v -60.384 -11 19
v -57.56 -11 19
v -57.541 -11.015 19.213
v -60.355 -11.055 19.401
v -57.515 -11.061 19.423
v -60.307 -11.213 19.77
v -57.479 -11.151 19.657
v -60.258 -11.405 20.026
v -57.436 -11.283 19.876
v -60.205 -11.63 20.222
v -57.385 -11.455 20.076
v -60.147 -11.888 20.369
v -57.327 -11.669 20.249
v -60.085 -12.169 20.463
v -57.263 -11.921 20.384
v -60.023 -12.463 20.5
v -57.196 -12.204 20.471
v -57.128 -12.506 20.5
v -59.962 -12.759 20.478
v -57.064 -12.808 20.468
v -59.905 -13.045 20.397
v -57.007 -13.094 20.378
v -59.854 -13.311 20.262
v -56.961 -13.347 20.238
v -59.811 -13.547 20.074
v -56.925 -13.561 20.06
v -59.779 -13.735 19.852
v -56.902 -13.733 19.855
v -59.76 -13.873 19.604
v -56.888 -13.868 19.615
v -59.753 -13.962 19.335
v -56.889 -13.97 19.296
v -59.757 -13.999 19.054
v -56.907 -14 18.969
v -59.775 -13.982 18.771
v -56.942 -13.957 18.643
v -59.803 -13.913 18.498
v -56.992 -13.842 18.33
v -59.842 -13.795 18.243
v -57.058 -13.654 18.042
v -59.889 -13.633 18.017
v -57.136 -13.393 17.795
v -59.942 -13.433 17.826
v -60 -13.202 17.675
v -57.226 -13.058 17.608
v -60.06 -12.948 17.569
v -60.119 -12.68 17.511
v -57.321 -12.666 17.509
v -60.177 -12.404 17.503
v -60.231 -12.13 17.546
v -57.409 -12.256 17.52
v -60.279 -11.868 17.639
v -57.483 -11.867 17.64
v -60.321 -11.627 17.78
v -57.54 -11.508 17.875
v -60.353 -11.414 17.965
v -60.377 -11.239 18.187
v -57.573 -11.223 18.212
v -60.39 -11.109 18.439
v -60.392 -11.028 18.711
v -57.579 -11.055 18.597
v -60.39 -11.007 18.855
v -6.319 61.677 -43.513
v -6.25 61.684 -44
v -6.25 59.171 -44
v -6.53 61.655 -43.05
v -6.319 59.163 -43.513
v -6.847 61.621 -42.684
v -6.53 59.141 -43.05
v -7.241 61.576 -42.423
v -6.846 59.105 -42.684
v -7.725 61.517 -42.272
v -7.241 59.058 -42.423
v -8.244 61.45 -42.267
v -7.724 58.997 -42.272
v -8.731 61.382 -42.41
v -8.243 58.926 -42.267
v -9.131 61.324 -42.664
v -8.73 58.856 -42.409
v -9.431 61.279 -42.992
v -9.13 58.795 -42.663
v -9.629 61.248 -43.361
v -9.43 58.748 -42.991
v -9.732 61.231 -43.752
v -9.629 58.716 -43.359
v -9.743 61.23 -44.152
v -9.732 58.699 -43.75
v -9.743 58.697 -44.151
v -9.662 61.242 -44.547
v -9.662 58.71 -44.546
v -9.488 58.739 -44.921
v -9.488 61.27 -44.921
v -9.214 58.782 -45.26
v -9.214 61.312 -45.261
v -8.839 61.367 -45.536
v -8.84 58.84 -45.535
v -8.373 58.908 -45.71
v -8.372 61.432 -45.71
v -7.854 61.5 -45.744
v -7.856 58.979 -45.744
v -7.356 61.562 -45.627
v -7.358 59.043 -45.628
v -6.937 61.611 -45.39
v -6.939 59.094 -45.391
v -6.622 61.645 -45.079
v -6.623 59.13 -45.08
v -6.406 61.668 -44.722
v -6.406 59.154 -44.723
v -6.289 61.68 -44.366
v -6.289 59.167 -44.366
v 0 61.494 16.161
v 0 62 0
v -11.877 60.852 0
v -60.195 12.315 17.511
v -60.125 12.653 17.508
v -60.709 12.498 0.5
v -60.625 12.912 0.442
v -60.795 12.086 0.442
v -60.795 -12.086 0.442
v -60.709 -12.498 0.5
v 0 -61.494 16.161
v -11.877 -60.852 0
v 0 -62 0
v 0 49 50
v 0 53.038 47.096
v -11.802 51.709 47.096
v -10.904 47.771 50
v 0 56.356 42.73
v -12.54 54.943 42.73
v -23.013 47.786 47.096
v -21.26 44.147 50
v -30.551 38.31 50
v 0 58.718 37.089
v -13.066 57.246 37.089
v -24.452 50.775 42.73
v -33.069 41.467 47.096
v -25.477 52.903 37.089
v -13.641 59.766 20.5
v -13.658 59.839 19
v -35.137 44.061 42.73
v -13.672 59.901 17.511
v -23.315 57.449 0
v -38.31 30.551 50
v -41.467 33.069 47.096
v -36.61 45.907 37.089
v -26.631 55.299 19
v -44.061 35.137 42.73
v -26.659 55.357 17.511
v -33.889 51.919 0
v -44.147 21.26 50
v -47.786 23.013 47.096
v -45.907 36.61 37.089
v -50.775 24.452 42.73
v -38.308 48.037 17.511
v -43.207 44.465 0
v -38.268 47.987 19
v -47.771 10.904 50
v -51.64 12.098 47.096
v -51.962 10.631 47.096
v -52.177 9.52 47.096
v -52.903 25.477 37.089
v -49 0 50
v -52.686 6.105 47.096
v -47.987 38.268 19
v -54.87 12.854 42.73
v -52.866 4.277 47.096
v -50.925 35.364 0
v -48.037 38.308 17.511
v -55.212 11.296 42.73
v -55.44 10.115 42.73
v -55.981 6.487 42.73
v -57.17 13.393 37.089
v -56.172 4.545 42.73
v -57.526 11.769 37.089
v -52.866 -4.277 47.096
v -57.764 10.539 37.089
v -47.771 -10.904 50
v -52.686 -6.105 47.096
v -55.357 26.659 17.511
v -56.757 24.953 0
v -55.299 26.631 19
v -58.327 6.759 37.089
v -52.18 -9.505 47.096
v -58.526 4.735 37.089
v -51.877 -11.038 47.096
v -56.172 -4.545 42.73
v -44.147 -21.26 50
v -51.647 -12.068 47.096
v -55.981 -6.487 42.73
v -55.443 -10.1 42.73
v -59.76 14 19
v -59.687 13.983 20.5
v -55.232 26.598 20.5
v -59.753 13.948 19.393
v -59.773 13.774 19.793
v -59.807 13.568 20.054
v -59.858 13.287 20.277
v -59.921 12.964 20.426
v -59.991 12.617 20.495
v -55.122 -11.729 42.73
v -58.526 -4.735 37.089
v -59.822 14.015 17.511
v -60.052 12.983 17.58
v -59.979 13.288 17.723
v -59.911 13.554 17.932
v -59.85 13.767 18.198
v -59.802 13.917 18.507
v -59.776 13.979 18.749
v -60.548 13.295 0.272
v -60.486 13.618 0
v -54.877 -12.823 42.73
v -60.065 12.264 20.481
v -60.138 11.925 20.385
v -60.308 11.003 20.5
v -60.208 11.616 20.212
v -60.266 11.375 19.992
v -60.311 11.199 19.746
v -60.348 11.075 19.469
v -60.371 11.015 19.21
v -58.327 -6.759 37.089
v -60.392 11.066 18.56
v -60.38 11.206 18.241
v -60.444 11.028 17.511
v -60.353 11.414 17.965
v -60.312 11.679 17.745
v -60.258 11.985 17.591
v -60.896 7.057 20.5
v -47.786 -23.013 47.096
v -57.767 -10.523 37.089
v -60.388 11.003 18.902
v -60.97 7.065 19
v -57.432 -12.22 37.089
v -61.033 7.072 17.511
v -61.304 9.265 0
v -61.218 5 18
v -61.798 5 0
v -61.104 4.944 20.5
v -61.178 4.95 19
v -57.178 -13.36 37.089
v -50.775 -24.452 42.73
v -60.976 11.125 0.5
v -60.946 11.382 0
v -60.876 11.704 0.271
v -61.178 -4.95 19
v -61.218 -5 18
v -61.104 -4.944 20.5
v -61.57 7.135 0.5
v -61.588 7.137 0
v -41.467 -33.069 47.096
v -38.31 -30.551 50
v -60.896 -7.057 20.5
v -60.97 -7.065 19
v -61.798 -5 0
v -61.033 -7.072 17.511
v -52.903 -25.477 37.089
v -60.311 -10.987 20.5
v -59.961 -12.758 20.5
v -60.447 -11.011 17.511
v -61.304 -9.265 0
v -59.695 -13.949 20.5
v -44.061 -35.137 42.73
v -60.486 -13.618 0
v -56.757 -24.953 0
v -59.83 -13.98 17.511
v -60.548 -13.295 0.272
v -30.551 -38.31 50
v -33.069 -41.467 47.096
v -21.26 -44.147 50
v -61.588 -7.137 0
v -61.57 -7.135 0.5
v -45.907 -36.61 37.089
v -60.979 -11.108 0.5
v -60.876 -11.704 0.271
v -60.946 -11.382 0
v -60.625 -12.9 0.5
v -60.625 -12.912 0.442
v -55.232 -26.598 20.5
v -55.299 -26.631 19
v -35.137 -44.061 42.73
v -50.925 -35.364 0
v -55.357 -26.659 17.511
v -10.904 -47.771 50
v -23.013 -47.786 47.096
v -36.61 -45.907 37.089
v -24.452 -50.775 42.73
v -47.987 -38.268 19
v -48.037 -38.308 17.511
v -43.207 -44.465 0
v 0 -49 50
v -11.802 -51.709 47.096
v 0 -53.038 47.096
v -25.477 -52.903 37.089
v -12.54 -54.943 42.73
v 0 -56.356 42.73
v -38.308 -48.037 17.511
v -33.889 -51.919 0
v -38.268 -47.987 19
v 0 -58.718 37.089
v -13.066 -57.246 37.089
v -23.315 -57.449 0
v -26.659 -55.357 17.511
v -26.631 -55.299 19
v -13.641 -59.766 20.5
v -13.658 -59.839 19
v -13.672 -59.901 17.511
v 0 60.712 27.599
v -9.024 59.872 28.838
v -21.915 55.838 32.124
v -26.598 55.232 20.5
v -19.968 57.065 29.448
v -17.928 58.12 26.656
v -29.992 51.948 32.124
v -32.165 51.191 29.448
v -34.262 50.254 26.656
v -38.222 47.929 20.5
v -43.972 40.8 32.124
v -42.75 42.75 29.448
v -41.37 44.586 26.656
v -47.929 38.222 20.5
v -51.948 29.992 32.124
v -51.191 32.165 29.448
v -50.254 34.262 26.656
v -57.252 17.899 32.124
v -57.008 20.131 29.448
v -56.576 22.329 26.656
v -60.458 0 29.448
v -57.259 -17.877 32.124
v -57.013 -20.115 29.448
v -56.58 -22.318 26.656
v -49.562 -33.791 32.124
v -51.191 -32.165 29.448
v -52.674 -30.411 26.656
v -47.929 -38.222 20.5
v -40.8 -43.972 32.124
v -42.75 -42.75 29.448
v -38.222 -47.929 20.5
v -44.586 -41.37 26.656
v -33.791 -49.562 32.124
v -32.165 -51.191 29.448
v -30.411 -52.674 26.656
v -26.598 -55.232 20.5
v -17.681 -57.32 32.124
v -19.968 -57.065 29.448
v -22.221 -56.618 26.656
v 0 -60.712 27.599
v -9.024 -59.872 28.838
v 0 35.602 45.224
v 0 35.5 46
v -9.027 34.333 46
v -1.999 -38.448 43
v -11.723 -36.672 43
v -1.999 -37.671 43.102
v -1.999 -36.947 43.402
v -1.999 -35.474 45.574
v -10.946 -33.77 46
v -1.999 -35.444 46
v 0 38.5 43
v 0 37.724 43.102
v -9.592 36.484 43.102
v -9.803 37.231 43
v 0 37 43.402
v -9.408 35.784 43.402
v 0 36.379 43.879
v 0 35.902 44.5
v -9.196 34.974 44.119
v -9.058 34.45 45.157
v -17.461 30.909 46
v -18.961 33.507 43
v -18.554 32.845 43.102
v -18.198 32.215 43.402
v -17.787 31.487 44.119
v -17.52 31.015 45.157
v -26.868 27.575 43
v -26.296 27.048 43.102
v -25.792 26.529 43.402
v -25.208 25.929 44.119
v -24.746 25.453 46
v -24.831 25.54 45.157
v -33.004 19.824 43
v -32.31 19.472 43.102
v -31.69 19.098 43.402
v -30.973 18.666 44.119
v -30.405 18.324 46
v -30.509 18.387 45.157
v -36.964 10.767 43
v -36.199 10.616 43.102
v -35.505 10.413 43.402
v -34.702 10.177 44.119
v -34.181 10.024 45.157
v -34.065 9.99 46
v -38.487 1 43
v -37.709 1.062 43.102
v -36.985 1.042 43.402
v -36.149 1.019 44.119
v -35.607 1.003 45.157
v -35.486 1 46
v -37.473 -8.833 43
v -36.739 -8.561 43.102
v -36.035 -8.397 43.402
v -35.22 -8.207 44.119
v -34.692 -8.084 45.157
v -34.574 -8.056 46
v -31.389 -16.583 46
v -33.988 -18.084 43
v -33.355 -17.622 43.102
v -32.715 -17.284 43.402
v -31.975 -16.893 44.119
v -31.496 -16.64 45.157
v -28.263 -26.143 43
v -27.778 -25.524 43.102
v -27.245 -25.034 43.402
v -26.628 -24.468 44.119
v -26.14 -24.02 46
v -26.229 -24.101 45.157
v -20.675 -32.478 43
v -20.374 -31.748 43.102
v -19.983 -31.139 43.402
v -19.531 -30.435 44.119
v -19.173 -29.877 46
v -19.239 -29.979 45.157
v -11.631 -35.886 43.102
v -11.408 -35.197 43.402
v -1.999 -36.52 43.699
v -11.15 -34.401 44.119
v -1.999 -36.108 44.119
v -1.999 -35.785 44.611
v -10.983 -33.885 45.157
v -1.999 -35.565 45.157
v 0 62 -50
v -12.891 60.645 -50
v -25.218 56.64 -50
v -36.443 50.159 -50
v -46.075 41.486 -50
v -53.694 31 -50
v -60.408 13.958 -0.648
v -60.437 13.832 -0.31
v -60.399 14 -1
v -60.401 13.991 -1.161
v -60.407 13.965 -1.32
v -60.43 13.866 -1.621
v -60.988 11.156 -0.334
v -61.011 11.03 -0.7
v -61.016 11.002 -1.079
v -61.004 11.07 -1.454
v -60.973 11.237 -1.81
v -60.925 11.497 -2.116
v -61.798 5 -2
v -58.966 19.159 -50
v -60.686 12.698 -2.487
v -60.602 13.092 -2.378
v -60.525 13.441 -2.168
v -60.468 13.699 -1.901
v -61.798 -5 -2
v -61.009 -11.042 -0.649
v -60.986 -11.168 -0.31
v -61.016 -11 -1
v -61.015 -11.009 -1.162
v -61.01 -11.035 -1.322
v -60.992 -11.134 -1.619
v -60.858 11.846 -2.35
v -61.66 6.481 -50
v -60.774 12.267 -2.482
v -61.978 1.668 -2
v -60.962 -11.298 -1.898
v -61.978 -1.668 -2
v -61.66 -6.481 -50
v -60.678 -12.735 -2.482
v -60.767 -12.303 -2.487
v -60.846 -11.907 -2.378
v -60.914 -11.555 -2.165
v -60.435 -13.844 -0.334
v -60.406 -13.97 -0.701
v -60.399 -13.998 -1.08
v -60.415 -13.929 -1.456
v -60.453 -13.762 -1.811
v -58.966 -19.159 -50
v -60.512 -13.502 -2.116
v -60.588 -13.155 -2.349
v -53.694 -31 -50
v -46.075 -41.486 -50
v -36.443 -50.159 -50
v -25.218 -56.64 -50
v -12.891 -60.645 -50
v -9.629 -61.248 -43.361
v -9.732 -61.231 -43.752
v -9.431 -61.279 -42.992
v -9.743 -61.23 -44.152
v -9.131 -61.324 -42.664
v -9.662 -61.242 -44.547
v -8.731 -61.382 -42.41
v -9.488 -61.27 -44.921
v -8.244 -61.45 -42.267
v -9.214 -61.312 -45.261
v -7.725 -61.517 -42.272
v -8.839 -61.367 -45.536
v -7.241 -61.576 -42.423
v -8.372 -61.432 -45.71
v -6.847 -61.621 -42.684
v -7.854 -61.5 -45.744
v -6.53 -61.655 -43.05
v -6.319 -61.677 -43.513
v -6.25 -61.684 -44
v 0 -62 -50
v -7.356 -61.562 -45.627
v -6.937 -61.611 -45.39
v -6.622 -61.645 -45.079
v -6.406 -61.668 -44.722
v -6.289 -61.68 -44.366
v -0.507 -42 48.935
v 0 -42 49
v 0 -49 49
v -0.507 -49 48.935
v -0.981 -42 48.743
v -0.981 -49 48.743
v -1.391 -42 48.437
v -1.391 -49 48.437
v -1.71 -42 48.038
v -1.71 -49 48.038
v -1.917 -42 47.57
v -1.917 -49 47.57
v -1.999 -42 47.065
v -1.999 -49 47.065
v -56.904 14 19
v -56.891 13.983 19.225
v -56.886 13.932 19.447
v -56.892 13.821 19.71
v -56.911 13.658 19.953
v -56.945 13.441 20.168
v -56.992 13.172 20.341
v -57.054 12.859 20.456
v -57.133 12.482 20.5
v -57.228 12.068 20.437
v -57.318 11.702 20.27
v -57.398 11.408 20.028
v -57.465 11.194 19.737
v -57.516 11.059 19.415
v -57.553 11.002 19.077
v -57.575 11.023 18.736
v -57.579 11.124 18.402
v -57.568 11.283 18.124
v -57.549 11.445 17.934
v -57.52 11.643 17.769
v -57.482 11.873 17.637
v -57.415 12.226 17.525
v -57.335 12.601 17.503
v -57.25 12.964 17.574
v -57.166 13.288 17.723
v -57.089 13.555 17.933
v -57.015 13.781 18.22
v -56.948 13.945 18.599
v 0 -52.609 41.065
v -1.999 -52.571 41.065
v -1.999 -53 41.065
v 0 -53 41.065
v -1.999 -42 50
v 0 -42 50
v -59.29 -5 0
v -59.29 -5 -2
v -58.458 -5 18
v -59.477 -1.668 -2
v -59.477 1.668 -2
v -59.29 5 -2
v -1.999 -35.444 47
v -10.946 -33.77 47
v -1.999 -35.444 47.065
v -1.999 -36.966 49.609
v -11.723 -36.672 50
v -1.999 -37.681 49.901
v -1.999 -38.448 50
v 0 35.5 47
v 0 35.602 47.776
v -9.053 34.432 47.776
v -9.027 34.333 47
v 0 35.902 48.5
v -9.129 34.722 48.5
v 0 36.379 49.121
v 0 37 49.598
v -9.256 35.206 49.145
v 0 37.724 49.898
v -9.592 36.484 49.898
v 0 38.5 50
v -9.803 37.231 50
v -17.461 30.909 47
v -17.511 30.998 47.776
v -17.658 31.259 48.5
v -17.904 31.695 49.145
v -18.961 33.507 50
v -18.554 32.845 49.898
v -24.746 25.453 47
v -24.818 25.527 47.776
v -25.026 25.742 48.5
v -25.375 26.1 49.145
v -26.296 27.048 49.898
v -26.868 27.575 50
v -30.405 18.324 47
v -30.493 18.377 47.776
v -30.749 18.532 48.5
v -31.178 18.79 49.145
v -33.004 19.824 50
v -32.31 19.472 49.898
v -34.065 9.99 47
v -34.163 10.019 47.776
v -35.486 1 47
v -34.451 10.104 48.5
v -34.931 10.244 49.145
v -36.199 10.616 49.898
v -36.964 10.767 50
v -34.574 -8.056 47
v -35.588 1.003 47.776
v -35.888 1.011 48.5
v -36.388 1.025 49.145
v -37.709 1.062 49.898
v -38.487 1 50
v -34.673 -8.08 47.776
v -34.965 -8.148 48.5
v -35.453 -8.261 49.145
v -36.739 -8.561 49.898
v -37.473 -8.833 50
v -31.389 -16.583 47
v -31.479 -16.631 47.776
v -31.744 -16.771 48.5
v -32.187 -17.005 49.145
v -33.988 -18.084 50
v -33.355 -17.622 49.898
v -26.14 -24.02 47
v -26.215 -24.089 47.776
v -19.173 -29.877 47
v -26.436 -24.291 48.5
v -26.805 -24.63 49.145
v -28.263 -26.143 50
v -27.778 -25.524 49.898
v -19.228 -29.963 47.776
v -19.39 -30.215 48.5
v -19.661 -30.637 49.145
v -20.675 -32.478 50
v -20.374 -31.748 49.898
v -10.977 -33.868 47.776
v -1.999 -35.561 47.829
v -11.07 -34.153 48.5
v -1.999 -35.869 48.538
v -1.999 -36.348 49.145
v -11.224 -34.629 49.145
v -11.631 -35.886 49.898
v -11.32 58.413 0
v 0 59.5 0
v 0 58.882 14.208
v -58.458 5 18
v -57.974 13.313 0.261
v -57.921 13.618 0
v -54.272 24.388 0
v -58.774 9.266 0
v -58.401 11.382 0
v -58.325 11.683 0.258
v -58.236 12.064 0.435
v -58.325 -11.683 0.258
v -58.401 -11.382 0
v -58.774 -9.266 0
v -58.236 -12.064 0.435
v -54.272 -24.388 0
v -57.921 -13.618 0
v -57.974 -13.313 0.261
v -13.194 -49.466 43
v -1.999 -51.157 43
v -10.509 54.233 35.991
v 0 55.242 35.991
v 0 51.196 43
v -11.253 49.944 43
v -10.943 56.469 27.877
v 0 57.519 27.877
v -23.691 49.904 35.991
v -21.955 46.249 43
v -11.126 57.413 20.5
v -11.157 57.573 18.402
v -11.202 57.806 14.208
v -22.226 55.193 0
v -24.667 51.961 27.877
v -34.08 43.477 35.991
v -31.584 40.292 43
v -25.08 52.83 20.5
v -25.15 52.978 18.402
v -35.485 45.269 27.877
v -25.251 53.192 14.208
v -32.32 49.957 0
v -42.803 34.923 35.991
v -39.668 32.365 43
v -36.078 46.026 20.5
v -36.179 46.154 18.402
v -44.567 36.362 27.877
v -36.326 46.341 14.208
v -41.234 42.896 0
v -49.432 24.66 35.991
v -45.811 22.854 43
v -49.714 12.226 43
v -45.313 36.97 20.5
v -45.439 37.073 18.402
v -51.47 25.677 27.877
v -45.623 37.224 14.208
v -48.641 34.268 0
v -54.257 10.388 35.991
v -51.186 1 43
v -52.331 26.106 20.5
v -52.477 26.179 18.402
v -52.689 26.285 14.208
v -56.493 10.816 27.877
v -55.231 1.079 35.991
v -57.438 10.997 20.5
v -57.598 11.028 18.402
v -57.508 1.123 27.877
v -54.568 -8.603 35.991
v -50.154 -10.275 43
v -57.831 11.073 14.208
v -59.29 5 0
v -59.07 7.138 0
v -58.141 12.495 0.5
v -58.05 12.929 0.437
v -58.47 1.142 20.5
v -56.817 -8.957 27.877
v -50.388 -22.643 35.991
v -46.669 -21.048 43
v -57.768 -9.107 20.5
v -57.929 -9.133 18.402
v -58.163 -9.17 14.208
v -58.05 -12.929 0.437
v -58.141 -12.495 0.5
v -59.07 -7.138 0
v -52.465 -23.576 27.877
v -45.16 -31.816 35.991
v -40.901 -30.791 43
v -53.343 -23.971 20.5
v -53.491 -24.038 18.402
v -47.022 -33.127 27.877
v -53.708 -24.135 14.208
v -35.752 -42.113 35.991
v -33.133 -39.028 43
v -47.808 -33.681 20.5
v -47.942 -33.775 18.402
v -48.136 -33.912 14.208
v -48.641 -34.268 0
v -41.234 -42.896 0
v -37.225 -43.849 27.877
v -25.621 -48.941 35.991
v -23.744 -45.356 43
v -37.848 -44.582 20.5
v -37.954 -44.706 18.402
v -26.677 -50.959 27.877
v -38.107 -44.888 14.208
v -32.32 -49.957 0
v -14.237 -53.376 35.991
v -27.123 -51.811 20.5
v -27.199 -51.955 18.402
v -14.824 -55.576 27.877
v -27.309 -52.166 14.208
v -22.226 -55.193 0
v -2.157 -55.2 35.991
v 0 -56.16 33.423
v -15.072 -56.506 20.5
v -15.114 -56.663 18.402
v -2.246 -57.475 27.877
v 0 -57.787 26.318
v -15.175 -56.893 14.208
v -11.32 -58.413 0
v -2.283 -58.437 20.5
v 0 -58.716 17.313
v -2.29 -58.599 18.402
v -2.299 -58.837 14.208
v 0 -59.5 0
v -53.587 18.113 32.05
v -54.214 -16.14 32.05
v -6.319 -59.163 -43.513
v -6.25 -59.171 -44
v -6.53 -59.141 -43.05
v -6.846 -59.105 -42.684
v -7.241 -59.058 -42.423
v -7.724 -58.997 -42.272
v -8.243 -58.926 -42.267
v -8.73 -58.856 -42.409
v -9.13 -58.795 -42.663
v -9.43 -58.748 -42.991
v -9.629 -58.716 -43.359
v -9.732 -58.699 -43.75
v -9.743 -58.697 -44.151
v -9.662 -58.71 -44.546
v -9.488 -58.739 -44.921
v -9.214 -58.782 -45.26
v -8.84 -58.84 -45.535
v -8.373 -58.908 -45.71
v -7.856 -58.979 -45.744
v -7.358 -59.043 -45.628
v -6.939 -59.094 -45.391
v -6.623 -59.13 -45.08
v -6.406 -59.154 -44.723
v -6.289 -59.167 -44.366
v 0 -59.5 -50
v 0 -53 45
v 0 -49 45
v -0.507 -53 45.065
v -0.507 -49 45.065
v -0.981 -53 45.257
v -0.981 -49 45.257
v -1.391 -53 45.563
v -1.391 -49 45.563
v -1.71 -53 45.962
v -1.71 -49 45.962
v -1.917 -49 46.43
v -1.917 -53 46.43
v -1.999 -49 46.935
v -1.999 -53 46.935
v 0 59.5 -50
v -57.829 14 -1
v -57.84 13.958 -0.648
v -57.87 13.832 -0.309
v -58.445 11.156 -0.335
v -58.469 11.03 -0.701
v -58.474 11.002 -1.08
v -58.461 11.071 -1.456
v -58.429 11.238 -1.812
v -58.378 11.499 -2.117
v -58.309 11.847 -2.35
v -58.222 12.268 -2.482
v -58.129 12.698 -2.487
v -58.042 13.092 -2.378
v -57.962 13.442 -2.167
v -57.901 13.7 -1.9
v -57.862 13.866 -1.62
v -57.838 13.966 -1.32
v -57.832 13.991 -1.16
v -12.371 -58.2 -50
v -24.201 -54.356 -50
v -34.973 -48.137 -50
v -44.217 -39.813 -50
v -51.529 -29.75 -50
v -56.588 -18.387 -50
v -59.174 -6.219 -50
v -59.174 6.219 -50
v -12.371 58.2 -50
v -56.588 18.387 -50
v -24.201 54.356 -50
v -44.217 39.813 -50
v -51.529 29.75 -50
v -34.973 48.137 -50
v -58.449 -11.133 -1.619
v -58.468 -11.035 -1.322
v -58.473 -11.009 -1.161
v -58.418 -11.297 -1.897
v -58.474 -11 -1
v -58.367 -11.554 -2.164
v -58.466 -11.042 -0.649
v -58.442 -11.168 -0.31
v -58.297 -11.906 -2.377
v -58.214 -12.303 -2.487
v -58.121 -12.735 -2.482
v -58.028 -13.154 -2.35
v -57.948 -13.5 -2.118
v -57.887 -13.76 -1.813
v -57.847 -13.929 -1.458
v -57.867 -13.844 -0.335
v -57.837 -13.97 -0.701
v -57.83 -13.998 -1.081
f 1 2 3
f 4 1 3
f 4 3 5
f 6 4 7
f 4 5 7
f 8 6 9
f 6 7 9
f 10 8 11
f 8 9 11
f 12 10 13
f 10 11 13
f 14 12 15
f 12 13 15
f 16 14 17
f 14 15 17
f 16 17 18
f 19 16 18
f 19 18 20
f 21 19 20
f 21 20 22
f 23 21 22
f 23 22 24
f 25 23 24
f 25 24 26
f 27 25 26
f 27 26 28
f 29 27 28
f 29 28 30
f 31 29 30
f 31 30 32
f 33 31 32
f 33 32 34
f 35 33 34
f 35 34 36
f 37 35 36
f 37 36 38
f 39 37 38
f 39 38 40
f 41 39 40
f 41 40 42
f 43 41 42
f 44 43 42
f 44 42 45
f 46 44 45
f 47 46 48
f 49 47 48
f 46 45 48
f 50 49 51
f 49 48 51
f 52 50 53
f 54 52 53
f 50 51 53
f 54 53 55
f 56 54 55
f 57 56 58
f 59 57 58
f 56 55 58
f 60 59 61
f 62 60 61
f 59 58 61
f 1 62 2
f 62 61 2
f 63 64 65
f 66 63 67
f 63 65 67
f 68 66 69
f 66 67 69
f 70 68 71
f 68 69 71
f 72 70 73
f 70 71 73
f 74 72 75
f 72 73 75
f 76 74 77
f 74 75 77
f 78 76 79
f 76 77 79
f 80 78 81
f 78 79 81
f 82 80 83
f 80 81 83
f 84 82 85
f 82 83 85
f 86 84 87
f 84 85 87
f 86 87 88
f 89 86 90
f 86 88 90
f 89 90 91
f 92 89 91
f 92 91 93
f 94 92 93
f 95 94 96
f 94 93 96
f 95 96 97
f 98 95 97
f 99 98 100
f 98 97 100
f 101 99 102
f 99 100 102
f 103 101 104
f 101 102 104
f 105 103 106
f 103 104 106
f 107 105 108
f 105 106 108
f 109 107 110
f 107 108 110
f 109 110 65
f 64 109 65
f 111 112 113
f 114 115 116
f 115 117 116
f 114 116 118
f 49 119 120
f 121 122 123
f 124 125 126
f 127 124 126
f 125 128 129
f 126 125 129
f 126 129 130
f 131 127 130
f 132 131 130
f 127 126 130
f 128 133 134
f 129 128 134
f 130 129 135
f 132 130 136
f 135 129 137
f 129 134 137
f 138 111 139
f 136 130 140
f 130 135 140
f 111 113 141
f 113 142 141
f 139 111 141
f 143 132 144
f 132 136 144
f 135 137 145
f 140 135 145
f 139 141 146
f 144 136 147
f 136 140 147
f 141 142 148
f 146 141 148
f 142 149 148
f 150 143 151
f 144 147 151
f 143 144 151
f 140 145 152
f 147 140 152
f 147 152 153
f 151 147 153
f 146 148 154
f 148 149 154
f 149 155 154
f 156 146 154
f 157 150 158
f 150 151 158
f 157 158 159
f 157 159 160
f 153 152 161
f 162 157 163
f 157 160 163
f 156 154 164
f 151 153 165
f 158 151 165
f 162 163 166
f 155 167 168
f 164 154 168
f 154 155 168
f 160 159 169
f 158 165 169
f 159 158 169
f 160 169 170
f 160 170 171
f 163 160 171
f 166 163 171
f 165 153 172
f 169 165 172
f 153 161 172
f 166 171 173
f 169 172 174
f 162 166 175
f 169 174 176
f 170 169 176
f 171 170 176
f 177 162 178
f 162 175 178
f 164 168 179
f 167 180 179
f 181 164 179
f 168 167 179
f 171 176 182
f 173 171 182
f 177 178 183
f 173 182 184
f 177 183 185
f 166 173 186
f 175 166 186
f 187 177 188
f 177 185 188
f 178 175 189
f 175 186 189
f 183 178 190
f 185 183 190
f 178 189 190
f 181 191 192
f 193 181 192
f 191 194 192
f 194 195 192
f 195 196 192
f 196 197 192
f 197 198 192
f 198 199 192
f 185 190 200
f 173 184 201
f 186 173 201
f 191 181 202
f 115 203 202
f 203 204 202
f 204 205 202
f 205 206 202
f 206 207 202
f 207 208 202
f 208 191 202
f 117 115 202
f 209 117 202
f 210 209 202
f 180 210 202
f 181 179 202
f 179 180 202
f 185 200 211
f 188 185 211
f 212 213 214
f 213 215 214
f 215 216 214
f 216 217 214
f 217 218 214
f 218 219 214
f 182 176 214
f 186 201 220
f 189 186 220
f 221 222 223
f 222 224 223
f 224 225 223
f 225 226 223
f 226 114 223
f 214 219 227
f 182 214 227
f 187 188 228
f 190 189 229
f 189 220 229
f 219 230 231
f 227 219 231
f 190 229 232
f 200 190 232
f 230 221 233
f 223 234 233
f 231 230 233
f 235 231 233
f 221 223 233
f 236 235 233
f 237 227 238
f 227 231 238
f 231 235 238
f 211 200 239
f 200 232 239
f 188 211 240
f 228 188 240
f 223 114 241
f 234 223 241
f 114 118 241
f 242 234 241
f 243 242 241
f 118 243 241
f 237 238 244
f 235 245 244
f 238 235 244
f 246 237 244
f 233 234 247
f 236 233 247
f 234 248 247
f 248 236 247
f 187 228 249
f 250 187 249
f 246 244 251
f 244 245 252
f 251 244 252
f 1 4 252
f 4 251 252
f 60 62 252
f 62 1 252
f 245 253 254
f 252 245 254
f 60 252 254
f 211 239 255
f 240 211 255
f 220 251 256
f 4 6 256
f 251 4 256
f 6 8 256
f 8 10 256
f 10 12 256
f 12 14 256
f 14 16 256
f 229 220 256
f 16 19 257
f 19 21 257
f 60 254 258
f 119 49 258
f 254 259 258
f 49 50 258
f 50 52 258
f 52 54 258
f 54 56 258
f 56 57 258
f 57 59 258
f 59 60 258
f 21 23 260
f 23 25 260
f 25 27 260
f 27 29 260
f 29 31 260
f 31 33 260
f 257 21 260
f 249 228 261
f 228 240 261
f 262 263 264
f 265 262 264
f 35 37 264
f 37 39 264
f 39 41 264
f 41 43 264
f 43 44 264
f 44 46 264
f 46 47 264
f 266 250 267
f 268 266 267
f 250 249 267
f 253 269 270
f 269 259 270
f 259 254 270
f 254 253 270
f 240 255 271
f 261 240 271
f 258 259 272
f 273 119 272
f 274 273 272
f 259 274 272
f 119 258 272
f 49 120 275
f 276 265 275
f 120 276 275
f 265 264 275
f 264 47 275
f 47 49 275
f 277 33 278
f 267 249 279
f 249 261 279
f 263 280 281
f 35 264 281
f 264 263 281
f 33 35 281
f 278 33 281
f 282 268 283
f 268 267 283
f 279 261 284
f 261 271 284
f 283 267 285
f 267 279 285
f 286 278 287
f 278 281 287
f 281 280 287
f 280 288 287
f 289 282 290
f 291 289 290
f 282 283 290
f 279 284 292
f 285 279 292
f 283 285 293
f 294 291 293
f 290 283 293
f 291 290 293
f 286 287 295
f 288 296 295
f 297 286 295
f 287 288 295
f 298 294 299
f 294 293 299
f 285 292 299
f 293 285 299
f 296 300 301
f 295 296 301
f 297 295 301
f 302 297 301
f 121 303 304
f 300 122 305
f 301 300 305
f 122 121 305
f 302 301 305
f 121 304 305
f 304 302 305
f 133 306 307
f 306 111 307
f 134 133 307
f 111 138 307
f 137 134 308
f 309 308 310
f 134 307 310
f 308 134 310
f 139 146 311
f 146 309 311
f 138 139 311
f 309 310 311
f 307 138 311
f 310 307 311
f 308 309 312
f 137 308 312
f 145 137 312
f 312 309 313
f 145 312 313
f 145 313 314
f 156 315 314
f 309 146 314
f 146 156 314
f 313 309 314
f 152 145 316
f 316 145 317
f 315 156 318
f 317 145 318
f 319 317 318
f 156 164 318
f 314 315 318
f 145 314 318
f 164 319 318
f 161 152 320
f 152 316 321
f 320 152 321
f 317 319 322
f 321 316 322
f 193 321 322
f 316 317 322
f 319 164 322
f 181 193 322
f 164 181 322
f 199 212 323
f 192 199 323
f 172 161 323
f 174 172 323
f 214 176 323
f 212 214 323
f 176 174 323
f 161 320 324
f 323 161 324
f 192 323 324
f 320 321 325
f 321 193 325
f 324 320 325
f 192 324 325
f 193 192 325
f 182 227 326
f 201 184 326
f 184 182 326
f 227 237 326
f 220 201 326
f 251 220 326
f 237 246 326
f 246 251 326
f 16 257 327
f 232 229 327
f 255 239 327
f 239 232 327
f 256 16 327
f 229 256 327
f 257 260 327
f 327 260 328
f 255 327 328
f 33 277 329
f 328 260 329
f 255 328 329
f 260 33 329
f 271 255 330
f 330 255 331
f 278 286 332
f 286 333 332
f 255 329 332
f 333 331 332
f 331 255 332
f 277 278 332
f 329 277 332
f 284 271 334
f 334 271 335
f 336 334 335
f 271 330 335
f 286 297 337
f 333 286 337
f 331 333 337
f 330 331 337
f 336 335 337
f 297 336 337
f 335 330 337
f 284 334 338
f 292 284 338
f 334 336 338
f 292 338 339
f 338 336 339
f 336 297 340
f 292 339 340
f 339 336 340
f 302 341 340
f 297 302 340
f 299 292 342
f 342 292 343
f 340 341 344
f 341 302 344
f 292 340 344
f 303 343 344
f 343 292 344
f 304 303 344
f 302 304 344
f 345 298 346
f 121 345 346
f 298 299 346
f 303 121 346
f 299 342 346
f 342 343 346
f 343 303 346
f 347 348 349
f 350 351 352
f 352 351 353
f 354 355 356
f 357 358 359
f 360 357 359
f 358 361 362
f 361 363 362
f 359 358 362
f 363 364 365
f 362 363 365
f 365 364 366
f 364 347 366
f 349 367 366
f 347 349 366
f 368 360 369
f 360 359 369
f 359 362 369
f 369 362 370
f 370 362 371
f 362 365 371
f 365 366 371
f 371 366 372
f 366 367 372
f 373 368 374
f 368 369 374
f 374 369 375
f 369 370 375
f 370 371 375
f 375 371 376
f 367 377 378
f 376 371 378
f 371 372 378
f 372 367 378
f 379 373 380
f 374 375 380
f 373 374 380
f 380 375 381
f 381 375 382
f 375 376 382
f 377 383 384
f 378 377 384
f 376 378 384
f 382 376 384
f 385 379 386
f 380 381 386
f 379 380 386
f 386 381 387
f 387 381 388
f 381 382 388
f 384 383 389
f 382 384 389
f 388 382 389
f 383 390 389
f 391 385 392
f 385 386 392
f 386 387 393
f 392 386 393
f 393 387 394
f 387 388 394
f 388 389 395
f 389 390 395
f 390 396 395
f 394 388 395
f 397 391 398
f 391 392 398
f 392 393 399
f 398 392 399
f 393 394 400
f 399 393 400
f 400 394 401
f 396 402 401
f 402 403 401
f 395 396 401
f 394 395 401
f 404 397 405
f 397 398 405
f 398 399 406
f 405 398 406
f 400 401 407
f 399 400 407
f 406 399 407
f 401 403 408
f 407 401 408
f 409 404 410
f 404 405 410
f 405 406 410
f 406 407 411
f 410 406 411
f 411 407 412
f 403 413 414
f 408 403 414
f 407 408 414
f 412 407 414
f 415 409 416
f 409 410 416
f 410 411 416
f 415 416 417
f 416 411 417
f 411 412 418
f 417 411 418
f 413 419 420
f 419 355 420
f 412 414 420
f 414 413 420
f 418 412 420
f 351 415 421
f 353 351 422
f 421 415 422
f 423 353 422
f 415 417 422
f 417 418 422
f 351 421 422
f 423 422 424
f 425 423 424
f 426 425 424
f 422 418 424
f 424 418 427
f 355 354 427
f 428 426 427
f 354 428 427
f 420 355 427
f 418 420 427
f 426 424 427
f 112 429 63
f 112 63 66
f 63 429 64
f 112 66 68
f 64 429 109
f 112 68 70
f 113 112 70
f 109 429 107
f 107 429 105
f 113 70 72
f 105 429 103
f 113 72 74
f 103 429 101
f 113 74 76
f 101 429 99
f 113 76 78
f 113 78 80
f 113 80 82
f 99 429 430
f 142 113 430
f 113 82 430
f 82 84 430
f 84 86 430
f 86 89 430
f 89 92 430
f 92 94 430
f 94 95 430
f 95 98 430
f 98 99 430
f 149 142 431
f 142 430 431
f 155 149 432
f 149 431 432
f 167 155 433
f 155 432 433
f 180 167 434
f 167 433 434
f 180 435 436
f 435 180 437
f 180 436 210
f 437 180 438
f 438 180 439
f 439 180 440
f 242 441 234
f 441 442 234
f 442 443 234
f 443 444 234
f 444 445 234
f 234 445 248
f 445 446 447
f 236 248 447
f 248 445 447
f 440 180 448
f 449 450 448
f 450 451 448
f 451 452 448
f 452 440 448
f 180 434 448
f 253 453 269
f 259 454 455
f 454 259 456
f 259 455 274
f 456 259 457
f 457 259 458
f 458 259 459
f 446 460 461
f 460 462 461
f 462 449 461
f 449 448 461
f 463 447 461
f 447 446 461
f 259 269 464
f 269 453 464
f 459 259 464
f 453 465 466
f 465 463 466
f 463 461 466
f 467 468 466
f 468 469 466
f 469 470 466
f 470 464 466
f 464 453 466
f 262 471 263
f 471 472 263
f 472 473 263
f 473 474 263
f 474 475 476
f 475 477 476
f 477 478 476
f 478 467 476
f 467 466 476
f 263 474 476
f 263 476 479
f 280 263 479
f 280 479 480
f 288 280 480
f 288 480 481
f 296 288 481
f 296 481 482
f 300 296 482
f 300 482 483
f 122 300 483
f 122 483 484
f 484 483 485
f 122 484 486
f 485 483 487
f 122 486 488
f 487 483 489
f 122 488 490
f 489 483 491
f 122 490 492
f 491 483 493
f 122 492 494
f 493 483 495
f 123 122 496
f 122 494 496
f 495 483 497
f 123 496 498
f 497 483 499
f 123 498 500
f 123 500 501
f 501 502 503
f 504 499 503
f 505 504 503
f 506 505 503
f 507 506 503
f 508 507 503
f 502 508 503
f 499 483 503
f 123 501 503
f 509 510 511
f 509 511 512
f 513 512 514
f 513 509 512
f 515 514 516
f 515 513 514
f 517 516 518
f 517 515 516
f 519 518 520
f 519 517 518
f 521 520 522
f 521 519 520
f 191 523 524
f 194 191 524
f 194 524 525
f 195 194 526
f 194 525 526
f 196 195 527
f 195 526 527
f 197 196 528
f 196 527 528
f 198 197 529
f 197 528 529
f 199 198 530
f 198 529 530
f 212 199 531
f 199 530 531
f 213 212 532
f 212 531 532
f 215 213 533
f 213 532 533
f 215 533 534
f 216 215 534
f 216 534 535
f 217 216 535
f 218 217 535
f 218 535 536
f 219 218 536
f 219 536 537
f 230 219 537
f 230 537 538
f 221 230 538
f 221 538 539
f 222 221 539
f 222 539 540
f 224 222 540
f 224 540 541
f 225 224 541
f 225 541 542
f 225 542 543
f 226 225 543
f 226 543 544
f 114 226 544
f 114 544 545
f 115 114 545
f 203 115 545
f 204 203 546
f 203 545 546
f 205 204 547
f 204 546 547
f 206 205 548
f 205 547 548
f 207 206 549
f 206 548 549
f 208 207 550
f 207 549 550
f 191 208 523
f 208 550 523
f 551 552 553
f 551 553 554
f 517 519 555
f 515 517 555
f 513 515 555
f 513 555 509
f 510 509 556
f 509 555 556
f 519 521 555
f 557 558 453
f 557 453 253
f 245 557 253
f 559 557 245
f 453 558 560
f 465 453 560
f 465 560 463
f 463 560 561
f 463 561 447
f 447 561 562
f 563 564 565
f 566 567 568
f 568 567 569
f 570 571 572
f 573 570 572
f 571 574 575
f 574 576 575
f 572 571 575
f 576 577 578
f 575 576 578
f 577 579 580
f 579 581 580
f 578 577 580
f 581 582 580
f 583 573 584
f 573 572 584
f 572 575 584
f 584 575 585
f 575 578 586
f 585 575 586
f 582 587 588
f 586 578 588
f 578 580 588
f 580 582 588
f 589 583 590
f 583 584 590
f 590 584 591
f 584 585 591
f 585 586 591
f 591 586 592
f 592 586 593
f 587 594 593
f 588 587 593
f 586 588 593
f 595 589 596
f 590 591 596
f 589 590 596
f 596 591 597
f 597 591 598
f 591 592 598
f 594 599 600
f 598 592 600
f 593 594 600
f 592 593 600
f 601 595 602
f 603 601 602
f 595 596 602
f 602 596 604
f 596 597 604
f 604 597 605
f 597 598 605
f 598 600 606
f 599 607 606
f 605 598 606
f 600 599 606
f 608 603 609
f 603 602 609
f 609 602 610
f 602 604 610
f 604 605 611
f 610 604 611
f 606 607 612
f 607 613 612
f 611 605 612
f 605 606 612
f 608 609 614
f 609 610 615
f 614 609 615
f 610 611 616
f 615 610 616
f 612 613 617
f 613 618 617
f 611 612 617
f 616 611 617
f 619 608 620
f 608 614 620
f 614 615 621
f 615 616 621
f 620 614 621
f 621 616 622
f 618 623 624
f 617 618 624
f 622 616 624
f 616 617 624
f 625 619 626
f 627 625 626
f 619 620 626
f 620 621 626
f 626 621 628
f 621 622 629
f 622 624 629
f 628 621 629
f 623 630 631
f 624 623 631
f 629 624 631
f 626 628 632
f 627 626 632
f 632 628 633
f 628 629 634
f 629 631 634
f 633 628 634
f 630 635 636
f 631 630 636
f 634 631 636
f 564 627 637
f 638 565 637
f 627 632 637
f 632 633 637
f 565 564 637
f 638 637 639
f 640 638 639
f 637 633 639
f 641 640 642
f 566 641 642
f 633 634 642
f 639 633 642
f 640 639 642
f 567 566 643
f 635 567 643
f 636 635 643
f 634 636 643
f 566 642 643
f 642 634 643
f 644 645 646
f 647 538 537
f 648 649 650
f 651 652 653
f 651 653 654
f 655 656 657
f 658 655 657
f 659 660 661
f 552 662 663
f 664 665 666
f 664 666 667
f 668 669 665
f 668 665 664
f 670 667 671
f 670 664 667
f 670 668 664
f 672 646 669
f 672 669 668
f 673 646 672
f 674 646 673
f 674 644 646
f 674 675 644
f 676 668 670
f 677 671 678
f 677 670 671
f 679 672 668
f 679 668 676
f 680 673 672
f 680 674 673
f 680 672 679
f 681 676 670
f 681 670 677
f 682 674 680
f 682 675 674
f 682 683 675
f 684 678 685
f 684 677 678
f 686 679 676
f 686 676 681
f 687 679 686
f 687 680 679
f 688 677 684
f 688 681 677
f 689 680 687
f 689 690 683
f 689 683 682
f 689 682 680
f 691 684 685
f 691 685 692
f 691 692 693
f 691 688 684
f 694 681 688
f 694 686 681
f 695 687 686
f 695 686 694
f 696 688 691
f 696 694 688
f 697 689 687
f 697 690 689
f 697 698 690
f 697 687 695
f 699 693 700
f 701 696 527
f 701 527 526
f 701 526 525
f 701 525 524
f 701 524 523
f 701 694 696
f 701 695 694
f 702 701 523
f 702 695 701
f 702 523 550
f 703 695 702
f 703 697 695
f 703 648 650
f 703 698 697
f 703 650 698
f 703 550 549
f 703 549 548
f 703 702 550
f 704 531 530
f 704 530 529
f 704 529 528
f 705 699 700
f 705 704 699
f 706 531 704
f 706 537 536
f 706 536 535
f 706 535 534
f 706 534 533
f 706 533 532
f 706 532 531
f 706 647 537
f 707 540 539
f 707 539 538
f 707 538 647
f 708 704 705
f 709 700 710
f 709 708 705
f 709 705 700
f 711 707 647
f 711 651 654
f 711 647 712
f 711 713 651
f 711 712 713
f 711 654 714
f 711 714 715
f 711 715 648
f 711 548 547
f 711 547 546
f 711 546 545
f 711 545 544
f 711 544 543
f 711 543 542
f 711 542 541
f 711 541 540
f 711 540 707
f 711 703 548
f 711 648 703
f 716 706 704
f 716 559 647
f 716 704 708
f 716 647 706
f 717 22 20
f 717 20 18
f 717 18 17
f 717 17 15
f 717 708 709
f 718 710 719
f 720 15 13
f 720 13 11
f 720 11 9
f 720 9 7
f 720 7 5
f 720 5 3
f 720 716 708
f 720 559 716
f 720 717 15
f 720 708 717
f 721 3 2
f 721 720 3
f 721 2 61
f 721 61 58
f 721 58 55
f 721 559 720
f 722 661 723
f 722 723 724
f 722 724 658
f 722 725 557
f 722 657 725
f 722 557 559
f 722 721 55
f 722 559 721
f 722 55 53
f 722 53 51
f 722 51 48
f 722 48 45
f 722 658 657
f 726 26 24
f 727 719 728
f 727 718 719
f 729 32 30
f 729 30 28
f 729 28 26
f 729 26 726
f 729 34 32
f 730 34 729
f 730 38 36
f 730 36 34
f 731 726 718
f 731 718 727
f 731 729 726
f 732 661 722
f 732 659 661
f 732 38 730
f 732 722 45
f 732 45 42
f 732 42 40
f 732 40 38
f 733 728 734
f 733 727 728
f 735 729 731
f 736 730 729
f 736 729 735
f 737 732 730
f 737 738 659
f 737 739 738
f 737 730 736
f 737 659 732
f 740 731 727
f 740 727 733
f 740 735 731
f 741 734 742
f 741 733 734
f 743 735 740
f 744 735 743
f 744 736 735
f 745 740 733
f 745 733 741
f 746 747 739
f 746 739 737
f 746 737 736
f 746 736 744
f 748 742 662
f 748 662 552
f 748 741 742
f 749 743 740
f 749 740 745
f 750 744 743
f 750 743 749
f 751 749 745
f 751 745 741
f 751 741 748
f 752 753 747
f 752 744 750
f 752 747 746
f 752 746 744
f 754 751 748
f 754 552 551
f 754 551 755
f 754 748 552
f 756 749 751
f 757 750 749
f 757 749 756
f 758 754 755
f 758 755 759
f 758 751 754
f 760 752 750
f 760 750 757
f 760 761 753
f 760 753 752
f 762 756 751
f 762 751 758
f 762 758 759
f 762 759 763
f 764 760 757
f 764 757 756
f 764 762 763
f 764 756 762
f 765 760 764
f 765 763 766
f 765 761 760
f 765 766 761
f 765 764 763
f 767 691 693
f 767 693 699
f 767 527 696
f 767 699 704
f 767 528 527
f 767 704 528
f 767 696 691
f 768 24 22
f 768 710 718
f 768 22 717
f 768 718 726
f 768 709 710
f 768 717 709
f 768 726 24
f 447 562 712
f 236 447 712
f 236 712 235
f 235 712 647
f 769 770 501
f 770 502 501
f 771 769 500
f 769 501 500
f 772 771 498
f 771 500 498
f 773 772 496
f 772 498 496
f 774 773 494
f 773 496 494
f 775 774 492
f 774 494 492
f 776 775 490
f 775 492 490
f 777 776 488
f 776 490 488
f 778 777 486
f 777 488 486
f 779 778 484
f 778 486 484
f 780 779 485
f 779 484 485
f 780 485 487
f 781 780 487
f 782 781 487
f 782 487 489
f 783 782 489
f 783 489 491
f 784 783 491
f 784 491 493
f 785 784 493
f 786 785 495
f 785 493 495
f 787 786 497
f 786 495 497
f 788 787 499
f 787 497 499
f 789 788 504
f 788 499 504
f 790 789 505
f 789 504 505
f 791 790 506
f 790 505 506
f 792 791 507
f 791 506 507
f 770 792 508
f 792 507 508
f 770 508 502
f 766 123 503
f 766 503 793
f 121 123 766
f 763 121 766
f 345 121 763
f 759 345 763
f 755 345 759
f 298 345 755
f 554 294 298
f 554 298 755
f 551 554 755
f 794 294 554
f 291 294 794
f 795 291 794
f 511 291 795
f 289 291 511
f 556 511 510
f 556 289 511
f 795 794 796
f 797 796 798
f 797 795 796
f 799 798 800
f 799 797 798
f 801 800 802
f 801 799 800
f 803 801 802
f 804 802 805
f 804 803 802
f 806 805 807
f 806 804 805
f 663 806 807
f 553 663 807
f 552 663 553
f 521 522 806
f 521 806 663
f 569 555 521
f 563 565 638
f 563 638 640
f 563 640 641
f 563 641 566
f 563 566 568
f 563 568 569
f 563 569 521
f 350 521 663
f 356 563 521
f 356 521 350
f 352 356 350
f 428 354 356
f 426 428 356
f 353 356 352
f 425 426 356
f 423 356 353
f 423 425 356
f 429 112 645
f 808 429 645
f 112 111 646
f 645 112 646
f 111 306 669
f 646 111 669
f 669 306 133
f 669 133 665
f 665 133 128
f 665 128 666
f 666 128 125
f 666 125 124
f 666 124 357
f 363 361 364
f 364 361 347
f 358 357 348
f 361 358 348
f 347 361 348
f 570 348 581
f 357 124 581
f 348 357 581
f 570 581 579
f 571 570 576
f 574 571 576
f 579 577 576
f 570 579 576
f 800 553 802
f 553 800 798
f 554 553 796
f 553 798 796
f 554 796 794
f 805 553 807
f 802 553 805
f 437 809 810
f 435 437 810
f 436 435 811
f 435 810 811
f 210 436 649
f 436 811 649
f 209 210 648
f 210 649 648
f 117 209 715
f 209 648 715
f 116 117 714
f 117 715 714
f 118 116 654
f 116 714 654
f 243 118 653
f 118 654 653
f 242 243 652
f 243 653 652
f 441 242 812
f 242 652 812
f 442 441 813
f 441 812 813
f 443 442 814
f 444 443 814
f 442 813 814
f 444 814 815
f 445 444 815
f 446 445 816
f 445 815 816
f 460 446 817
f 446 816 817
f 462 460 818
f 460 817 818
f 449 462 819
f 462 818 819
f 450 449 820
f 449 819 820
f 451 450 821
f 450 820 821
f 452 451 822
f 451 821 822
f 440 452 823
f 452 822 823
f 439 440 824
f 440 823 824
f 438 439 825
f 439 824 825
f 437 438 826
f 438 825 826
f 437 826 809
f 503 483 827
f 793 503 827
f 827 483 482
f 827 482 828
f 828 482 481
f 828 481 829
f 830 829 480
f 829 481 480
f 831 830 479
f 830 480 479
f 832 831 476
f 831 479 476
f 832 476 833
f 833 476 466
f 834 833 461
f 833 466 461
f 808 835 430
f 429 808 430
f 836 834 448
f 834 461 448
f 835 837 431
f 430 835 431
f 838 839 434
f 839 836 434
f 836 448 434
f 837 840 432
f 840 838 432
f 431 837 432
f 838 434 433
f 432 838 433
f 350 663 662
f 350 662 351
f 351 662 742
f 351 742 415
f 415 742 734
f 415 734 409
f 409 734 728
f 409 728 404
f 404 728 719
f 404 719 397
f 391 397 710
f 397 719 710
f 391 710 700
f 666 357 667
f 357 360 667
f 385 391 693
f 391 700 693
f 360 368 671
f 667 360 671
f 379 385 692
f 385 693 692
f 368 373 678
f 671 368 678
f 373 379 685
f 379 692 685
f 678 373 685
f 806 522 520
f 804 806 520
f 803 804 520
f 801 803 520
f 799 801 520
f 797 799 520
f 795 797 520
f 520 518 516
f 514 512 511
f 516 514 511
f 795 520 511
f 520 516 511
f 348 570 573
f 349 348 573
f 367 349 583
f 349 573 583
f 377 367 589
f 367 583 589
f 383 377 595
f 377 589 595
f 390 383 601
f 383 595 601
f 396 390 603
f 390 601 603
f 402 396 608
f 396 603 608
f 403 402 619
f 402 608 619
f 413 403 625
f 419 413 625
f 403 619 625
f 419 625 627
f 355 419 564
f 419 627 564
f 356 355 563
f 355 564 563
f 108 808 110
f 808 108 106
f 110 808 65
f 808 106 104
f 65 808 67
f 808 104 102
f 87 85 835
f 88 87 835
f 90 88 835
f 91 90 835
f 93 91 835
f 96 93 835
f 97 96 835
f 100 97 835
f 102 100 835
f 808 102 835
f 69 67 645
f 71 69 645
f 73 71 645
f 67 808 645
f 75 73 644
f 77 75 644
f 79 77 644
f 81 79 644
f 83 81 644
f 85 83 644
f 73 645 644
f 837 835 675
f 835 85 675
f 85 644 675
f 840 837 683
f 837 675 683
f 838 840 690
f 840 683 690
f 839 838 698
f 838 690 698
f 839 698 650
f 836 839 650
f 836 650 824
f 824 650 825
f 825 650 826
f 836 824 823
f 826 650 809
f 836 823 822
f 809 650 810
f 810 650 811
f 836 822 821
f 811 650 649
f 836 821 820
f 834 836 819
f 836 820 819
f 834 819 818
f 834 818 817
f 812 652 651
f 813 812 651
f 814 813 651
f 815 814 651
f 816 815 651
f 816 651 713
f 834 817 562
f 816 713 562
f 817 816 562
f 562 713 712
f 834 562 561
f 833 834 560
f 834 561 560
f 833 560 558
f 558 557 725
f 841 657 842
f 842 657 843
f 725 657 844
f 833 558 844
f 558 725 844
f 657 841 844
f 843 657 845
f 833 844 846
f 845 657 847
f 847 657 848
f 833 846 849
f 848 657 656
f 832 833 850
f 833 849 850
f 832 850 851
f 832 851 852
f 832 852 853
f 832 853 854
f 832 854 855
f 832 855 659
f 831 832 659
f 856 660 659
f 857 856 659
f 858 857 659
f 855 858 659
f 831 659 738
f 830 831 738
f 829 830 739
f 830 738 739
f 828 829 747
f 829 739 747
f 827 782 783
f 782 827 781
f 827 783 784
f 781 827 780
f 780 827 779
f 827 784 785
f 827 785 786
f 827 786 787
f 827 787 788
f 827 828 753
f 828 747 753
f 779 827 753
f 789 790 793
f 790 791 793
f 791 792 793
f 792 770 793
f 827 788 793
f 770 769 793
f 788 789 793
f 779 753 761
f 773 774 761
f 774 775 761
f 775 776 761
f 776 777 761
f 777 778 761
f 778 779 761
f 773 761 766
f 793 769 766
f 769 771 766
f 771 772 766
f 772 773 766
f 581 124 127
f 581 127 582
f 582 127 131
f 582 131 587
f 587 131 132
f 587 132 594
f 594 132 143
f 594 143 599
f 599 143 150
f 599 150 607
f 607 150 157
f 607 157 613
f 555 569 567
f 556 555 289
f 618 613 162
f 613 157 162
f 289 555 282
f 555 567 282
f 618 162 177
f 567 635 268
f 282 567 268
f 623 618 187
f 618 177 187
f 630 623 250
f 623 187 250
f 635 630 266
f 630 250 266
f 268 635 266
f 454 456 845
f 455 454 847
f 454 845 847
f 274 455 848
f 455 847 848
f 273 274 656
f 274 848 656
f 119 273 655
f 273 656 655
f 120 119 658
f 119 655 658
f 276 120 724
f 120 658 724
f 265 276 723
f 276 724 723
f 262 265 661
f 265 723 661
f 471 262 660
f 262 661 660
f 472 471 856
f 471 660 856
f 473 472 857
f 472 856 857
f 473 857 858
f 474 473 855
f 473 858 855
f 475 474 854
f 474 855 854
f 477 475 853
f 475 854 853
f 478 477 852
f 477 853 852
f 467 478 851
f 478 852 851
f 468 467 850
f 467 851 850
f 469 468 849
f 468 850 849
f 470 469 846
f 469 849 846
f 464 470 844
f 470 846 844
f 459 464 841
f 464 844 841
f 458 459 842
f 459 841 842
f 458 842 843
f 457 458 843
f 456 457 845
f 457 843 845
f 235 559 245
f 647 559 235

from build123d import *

# Parameters (mm, degrees)
F1_ANGLE_BACK = 90
F1_ANGLE      = 180
F3_DEPTH      = 49
F4_DEPTH      = 42
F5_DEPTH      = 53
F6_R          = 1.75
F7_DEPTH      = 62.5
F8_W          = 10
F8_H          = 20
F8_R          = 1.5
F9_DEPTH      = 62.0010001


with BuildPart() as f1:
    # F0 (on Front) → F1 (revolve)
    with BuildSketch(Plane.XZ, mode=Mode.PRIVATE) as f1_sk:
        with BuildLine():
            ThreePointArc((-35.5, 47), (-36.3786796564, 49.1213203436), (-38.5, 50))
            Line((-38.5, 50), (-49, 50))
            add(Edge.make_bspline(
                [(-49, 50), (-50.0905438599, 49.4592544488), (-53.0493875637, 47.4989733534), (-57.4486951492, 41.931344871), (-61.5763053799, 28.0443008729), (-61.4881986154, 14.5014666819), (-62, 0)],
                knots=[0, 0, 0, 0, 0.1531073754, 0.3436852098, 0.6019385566, 1, 1, 1, 1], degree=3))
            Line((-62, 0), (-62, -50))
            Line((-62, -50), (-59.5, -50))
            Line((-59.5, -50), (-59.5, 0))
            add(Edge.make_bspline(
                [(-51.1955396277, 43), (-59.7999691963, 32.3488041759), (-58.4857873619, 15.5563373119), (-59.5, 0)],
                knots=[0, 0, 0, 0, 43.7945665817, 43.7945665817, 43.7945665817, 43.7945665817], degree=3))
            Line((-51.1955396277, 43), (-38.5, 43))
            ThreePointArc((-38.5, 43), (-36.3786796564, 43.8786796564), (-35.5, 46))
            Line((-35.5, 46), (-35.5, 47))
        make_face()
    revolve(f1_sk.sketch.rotate(Axis((0, 0, -47.5967168808), (0, 0, 1)), -F1_ANGLE_BACK), axis=Axis((0, 0, -47.5967168808), (0, 0, 1)), revolution_arc=F1_ANGLE)

    # F2 (on Front) → F3 (cut)
    with BuildSketch(Plane.XZ):
        with BuildLine():
            ThreePointArc((0, 45), (1.4142135624, 45.5857864376), (2, 47))
            ThreePointArc((2, 47), (1.4142135624, 48.4142135624), (0, 49))
            ThreePointArc((0, 49), (-1.3909130574, 48.4371363424), (-1.998931704, 47.0653608667))
            Line((-1.998931704, 47.0653608667), (-1.998931704, 46.9346391333))
            ThreePointArc((-1.998931704, 46.9346391333), (-1.3909130574, 45.5628636576), (0, 45))
        make_face()
    extrude(amount=F3_DEPTH, mode=Mode.SUBTRACT)

    # F2 (on Front) → F4 (cut)
    with BuildSketch(Plane.XZ):
        with BuildLine():
            ThreePointArc((-1.998931704, 47.0653608667), (-1.3909130574, 48.4371363424), (0, 49))
            Line((0, 49), (0, 50.3604523001))
            Line((0, 50.3604523001), (-1.998931704, 50.3604523001))
            Line((-1.998931704, 50.3604523001), (-1.998931704, 47.0653608667))
        make_face()
    extrude(amount=F4_DEPTH, mode=Mode.SUBTRACT)

    # F2 (on Front) → F5 (cut)
    with BuildSketch(Plane.XZ):
        with BuildLine():
            Line((0, 41.0653608667), (0, 45))
            ThreePointArc((0, 45), (-1.3909130574, 45.5628636576), (-1.998931704, 46.9346391333))
            Line((-1.998931704, 46.9346391333), (-1.998931704, 41.0653608667))
            Line((-1.998931704, 41.0653608667), (0, 41.0653608667))
        make_face()
    extrude(amount=F5_DEPTH, mode=Mode.SUBTRACT)

    # F6 (on Front) → F7 (cut, symmetric)
    with BuildSketch(Plane.XZ):
        with Locations((-8, -44)):
            Circle(F6_R)
    extrude(amount=F7_DEPTH, both=True, mode=Mode.SUBTRACT)

    # F8 (on Right) → F9 (cut, through all)
    with BuildSketch(Plane.YZ):
        with Locations((0, 8)):
            Rectangle(F8_W, F8_H)
        with Locations((-12.5, 19)):
            Circle(F8_R)
        with Locations((12.5, 19)):
            Circle(F8_R)
        with Locations((12.5, -1)):
            Circle(F8_R)
        with Locations((-12.5, -1)):
            Circle(F8_R)
    extrude(amount=-F9_DEPTH, mode=Mode.SUBTRACT)


solid = f1.part
